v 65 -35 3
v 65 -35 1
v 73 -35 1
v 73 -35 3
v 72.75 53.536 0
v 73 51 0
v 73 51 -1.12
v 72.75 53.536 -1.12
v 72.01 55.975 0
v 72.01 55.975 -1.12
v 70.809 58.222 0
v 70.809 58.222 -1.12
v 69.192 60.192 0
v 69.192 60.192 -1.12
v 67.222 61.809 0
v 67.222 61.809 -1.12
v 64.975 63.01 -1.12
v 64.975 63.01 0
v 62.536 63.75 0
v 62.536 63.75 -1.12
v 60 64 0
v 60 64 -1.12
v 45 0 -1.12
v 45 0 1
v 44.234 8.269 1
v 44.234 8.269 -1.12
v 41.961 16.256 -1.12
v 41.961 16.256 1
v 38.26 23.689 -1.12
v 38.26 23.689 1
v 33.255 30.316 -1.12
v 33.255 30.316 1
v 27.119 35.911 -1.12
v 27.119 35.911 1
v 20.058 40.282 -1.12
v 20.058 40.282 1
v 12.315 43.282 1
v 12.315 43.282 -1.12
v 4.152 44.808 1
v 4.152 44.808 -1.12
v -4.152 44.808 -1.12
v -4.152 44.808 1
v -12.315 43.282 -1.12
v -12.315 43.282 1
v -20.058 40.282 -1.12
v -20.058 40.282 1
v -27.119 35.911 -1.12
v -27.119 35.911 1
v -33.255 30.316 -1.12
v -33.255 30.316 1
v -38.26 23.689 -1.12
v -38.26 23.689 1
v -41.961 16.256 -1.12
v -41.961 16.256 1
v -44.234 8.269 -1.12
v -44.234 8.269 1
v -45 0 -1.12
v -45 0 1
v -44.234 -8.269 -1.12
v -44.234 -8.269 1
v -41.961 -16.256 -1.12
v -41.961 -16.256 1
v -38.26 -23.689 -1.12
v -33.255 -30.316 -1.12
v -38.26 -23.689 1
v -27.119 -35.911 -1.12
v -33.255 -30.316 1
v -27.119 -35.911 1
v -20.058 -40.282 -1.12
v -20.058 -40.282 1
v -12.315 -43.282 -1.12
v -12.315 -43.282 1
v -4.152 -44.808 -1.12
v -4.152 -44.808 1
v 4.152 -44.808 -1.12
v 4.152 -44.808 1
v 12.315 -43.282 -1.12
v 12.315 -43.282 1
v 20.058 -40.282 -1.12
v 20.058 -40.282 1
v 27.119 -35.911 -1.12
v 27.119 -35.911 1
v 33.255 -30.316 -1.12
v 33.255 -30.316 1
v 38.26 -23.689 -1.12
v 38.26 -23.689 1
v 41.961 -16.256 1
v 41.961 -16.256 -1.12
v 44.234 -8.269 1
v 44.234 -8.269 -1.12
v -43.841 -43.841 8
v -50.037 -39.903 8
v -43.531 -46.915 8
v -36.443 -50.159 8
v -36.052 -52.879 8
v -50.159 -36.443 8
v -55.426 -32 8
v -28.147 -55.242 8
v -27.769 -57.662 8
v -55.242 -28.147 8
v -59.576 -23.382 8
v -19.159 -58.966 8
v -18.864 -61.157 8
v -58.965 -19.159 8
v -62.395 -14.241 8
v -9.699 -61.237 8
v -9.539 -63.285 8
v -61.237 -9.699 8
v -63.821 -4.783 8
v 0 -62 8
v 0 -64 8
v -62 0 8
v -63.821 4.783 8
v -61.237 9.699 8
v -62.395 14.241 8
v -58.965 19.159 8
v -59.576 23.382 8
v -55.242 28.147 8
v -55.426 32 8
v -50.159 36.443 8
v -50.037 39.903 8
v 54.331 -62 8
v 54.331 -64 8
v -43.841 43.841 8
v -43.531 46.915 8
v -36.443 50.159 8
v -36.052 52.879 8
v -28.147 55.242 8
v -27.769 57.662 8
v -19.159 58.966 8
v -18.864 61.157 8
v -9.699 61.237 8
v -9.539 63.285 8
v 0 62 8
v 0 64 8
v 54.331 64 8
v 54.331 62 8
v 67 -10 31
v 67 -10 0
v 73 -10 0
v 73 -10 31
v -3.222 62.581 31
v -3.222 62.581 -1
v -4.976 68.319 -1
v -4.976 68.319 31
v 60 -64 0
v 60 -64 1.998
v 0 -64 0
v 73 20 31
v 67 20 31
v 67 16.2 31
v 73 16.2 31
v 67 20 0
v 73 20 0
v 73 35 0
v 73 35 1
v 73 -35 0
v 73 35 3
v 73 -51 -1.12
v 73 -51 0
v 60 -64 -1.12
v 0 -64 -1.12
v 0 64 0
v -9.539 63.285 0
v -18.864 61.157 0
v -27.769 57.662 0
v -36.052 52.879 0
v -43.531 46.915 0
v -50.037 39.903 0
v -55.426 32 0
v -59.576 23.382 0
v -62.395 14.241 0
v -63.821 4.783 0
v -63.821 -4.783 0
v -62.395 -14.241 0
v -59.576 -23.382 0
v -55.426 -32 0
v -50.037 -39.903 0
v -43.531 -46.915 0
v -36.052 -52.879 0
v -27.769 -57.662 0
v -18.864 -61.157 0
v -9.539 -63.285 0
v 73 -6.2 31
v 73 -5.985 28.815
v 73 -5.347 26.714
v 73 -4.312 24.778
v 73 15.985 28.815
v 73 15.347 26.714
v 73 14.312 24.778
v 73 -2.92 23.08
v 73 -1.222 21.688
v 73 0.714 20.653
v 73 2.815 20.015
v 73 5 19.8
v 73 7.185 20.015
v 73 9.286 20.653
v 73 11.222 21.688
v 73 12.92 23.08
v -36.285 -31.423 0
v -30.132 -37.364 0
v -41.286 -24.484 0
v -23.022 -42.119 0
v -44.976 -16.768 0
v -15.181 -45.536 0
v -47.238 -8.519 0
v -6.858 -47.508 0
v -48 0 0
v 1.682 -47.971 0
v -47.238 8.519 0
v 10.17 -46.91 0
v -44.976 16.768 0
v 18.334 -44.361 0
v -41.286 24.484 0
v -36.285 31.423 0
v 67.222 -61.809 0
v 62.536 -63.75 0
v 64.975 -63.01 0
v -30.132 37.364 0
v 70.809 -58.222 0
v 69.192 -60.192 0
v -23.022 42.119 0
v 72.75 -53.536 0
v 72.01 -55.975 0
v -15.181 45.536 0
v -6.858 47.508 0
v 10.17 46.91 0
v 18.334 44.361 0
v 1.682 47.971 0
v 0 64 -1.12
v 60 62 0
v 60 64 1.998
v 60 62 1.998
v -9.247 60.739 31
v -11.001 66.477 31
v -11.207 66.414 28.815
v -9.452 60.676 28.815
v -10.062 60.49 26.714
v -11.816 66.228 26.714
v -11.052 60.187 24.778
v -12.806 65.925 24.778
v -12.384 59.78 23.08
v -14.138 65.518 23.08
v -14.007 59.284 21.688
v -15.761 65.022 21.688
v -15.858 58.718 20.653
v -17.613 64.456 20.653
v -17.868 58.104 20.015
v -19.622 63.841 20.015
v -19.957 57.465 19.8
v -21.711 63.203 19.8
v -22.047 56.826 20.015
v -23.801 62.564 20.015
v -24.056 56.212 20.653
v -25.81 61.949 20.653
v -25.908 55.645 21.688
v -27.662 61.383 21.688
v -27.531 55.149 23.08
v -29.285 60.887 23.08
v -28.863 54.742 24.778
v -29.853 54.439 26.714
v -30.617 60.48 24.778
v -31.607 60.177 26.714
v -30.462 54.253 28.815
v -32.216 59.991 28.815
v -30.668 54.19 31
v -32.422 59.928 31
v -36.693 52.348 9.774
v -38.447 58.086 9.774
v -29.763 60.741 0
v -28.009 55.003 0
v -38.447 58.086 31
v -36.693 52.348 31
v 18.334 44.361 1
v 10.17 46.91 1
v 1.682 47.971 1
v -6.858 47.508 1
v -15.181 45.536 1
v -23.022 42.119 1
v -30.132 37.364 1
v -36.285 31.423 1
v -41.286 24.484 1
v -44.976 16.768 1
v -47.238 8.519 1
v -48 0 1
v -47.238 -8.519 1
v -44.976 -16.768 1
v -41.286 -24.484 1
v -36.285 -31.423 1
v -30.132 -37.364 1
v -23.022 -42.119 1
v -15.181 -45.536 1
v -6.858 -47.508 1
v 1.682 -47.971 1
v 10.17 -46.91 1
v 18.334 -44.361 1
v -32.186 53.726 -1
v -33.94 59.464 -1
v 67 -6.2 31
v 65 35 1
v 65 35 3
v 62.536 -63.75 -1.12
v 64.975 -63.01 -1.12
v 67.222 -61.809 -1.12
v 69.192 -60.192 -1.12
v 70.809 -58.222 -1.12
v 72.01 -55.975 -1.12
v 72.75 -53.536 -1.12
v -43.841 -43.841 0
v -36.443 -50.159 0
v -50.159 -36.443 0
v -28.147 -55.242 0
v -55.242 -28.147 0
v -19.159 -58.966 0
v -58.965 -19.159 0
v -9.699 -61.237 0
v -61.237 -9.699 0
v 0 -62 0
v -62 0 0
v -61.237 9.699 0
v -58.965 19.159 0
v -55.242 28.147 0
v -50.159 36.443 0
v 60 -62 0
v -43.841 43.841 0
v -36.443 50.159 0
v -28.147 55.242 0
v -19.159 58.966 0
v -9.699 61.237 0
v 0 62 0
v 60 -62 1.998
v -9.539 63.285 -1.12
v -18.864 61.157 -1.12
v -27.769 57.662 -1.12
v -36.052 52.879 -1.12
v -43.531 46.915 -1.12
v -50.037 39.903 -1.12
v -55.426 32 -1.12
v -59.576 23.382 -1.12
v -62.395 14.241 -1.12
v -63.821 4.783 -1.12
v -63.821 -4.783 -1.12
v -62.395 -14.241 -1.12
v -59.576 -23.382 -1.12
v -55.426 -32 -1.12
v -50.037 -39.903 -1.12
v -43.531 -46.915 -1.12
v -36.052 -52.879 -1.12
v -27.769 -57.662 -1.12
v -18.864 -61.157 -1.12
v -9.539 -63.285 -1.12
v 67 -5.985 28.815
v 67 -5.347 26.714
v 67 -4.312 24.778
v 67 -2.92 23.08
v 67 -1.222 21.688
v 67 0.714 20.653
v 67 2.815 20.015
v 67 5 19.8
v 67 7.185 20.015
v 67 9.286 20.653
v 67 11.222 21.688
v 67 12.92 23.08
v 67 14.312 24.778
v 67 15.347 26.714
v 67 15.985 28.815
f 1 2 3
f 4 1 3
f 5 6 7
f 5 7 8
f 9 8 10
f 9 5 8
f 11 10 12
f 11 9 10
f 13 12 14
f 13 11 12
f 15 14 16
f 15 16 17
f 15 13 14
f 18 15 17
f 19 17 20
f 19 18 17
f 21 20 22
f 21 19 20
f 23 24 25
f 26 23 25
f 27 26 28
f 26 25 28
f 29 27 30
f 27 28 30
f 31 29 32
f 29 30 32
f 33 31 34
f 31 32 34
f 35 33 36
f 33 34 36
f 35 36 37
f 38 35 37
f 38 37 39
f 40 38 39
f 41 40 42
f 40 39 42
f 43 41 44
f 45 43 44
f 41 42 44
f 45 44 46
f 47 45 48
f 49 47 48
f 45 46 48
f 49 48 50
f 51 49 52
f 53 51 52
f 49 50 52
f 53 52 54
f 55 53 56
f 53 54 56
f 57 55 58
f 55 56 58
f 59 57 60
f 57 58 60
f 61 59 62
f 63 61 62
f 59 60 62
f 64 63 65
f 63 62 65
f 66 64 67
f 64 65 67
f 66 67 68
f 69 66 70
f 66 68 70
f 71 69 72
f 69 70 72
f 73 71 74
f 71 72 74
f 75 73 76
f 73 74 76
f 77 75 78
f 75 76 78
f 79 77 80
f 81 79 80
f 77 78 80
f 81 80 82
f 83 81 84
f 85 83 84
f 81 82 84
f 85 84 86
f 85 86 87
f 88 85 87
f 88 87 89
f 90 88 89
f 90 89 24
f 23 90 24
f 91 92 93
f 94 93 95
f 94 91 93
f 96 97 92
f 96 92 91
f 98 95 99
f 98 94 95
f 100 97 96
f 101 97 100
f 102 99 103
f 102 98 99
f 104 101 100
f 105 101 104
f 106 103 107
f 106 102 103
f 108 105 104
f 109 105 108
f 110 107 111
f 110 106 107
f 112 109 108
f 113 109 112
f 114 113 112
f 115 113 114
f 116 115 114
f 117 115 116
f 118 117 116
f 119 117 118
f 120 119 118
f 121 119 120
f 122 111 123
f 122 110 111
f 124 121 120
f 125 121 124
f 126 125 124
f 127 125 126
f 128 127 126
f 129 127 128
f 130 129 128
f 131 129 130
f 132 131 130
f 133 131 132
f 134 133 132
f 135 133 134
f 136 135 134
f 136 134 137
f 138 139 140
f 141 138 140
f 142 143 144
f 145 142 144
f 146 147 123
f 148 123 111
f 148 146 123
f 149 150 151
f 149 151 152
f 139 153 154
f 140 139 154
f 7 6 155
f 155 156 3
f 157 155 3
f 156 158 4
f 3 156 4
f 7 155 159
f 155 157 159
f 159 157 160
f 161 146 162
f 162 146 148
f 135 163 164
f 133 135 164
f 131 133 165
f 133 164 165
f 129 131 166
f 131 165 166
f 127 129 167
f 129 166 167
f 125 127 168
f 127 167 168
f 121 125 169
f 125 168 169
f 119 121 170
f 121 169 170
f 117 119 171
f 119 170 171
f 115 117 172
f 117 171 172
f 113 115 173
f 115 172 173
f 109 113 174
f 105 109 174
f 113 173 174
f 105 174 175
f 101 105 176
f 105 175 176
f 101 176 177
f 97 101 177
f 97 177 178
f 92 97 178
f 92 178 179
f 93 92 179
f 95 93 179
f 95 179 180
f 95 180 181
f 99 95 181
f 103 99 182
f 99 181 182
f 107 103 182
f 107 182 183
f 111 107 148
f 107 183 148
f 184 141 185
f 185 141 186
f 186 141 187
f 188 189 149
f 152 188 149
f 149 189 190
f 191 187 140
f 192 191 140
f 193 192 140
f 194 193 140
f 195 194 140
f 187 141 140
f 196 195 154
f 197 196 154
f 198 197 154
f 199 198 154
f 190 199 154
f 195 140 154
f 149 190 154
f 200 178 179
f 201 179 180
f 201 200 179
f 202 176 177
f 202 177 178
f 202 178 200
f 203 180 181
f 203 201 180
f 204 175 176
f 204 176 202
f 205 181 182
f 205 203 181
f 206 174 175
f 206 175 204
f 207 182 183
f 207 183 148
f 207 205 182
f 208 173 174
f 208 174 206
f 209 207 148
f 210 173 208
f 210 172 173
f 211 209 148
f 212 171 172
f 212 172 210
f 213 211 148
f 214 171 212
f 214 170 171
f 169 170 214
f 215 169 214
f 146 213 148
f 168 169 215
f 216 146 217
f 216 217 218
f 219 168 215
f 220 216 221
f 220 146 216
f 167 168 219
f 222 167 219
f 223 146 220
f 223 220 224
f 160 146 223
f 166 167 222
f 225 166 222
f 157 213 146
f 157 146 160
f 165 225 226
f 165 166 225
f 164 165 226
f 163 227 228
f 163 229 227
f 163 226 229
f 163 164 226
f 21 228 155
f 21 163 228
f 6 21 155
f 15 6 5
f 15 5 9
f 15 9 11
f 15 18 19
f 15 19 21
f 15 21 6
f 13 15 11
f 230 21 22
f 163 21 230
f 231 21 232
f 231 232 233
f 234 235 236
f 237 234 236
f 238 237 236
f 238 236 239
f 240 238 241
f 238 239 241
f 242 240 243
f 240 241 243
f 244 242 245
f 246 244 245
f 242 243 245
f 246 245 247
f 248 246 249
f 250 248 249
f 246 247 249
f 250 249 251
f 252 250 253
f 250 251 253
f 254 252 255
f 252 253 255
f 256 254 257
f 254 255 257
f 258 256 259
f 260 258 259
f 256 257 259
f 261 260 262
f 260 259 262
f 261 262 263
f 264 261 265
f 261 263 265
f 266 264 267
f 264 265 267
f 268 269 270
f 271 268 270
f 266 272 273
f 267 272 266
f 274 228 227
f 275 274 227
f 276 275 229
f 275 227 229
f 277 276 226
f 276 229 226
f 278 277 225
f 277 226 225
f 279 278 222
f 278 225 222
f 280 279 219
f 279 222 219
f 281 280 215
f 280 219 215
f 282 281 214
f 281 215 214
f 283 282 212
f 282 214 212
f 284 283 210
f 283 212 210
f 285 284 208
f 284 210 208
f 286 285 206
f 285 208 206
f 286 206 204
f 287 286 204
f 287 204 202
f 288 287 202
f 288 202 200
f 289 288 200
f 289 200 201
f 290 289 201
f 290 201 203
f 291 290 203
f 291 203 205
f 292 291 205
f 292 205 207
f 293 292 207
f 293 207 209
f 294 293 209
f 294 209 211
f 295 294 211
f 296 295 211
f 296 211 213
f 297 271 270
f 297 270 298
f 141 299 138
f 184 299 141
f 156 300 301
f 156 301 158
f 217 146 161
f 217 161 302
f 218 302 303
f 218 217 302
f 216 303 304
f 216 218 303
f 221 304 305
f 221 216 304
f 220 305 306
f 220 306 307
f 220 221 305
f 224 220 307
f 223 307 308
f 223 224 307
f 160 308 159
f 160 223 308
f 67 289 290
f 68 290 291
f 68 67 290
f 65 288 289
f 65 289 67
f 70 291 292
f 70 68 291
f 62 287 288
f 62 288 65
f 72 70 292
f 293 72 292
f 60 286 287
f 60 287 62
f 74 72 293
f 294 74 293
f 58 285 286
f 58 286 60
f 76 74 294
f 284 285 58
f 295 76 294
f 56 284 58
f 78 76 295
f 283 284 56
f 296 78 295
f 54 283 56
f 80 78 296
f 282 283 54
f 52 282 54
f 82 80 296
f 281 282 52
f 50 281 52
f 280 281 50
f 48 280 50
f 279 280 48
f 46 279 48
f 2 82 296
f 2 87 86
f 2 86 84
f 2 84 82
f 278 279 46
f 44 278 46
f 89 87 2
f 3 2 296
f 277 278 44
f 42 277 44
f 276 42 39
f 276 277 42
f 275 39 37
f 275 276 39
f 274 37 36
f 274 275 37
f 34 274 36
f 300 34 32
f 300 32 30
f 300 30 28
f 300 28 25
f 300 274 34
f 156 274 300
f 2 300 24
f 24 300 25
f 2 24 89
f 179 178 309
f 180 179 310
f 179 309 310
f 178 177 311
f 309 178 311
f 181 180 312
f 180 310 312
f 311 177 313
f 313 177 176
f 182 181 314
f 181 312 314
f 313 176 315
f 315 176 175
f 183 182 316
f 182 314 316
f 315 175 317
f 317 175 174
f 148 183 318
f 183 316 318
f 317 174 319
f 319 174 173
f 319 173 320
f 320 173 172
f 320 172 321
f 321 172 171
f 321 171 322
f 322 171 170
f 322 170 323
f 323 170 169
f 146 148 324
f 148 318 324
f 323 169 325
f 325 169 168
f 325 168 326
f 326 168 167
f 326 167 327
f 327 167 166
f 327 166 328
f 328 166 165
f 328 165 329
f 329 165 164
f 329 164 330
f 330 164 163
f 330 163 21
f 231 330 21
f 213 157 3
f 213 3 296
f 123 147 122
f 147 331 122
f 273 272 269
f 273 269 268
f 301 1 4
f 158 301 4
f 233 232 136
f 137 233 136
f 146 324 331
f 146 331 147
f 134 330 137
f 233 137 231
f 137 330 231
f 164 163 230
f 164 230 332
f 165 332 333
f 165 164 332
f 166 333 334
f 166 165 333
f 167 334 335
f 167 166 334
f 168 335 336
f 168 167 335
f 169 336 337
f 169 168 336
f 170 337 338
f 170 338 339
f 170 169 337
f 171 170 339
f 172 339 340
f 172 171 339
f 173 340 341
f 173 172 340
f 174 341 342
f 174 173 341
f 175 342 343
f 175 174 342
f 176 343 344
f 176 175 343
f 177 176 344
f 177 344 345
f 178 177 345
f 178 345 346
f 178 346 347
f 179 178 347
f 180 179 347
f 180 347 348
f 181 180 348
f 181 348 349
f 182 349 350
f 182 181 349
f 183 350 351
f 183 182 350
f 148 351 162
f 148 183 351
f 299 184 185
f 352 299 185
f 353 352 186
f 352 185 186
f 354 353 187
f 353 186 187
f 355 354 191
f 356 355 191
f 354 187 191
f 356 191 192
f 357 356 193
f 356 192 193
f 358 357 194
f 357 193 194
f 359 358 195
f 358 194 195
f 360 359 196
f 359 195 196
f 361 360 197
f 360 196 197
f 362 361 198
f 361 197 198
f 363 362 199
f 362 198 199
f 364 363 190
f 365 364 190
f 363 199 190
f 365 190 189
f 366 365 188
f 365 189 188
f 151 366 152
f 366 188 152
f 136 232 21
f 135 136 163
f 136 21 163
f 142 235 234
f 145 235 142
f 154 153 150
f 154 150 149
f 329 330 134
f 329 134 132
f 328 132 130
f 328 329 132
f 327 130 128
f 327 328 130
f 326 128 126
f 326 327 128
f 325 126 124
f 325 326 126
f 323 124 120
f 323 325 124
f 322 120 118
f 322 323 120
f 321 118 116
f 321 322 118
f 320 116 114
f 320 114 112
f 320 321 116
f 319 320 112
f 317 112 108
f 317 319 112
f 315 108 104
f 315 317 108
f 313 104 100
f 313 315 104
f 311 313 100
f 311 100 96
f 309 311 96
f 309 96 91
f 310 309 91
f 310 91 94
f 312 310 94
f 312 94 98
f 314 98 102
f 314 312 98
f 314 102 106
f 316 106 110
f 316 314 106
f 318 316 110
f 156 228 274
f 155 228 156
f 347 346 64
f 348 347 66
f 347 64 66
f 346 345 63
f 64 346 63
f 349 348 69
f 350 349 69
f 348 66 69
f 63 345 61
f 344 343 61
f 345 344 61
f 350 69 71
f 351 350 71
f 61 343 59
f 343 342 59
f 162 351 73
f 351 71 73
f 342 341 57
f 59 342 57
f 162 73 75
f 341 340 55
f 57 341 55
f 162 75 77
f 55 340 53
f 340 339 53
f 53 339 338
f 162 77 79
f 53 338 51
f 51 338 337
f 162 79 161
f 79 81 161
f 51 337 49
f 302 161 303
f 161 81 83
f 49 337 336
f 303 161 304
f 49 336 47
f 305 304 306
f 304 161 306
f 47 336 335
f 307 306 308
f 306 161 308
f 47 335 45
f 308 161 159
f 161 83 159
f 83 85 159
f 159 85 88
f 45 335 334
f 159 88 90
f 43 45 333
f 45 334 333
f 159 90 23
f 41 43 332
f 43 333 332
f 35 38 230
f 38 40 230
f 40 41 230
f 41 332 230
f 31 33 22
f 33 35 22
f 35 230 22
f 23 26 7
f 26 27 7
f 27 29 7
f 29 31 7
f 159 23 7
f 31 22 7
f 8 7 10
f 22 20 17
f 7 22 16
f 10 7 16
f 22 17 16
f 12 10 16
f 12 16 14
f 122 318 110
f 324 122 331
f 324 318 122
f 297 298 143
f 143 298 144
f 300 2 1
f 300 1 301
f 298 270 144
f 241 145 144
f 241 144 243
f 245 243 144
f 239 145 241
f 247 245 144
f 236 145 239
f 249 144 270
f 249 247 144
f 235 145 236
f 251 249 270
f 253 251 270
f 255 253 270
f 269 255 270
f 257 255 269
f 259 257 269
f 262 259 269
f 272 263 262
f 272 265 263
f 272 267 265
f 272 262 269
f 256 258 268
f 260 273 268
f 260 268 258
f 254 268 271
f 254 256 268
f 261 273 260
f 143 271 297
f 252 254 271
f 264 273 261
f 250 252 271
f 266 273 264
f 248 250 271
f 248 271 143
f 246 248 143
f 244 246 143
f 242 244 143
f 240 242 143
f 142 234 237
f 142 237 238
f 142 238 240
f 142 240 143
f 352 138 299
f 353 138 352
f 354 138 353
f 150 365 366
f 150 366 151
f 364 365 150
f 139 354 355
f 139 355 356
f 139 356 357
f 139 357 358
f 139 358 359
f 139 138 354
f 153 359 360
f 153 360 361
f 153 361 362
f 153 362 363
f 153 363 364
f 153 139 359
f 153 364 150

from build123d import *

# Parameters (mm, degrees)
PAD001_DEPTH      = 8
POCKET005_DEPTH   = 128.0010000001
SKETCH020_W       = 6
SKETCH020_H       = 30
PAD004_DEPTH      = 31
SKETCH021_R       = 11.2
POCKET_DEPTH      = 6.001
PAD005_DEPTH      = 31
PAD005_DEPTH_BACK = 1
SKETCH022_R       = 11.2
POCKET006_DEPTH   = 15.7868758107
POCKET007_DEPTH   = 6
SKETCH001_R       = 45
PAD_DEPTH         = 1.12
SKETCH_W          = 8
SKETCH_H          = 70
PAD003_DEPTH      = 3
SKETCH024_R       = 48
PAD006_DEPTH      = 1
SKETCH025_R       = 45
POCKET008_DEPTH   = 2.121
PAD007_DEPTH      = 1
SKETCH027_R       = 45
POCKET009_DEPTH   = 2.121


with BuildPart() as bevel_connector:
    # Sketch002 → Pad001 (new body)
    with BuildSketch(Plane.XY):
        with BuildLine():
            Line((60, 64), (0, 64))
            ThreePointArc((0, 64), (-63.9999355288, 0), (0, -64))
            Line((60, -64), (0, -64))
            Line((60, -62), (60, -64))
            Line((0, -62), (60, -62))
            ThreePointArc((0, 62), (-61.9999854046, 0), (0, -62))
            Line((0, 62), (60, 62))
            Line((60, 64), (60, 62))
        make_face()
    extrude(amount=PAD001_DEPTH)

    # Sketch011 → Pocket005 (cut, through all)
    with BuildSketch(Plane(origin=(0, 64, 0), x_dir=(-1, 0, 0), z_dir=(0, 1, 0))):
        Polygon((-53.9525, 8.40024), (-64.2022626889, 10.8364072587), (-61.1871640783, 0.741768758), align=None)
    extrude(amount=-POCKET005_DEPTH, mode=Mode.SUBTRACT)


with BuildPart() as synchole:
    # Sketch020 → Pad004 (new body)
    with BuildSketch(Plane.XY):
        with Locations((70, 5)):
            Rectangle(SKETCH020_W, SKETCH020_H)
    extrude(amount=PAD004_DEPTH)

    # Sketch021 → Pocket (cut, through all)
    with BuildSketch(Plane.YZ.offset(73)):
        with Locations((5, 31)):
            Circle(SKETCH021_R)
    extrude(amount=-POCKET_DEPTH, mode=Mode.SUBTRACT)


with BuildPart() as stbevel1:
    # Sketch017 → Pad005 (new body, two sides)
    with BuildSketch(Plane.XY) as pad005_sk:
        Polygon((-4.9761521334, 68.3190157273), (-38.4468185922, 58.086006062), (-36.6925883638, 52.3481775262), (-3.2219219051, 62.5811871915), align=None)
    extrude(amount=PAD005_DEPTH)
    extrude(pad005_sk.sketch, amount=-PAD005_DEPTH_BACK)

    # Sketch022 → Pocket006 (cut, through all)
    with BuildSketch(Plane(origin=(-19.5271219074, 63.8703378224, 0), x_dir=(-0.956304756, -0.2923717047, 0), z_dir=(-0.2923717047, 0.956304756, 0))):
        with Locations((2.2841708584, 31)):
            Circle(SKETCH022_R)
    extrude(amount=-POCKET006_DEPTH, mode=Mode.SUBTRACT)

    # Sketch023 → Pocket007 (cut)
    with BuildSketch(Plane(origin=(-19.5271219074, 63.8703378224, 0), x_dir=(-0.956304756, -0.2923717047, 0), z_dir=(-0.2923717047, 0.956304756, 0))):
        Polygon((31.7540235497, 22.6567880743), (10.7035, 0), (40.8501158154, -6.9018941198), align=None)
    extrude(amount=-POCKET007_DEPTH, mode=Mode.SUBTRACT)


with BuildPart() as fieldstiffenerhole:
    # Sketch001 → Pad (new body)
    with BuildSketch(Plane.XY):
        with BuildLine():
            Line((60, 64), (0, 64))
            ThreePointArc((0, 63.9999999999), (-63.9999178097, 0), (0, -63.9999999999))
            Line((60, -63.9999999999), (0, -63.9999999999))
            ThreePointArc((60, -64), (69.1923881554, -60.1923881554), (73, -51))
            Line((73, 51), (73, -51))
            ThreePointArc((73, 51), (69.1923881554, 60.1923881554), (60, 64))
        make_face()
        Circle(SKETCH001_R, mode=Mode.SUBTRACT)
    extrude(amount=-PAD_DEPTH)

    # Sketch → Pad003 (new body)
    with BuildSketch(Plane.XY):
        with Locations((69, 0)):
            Rectangle(SKETCH_W, SKETCH_H)
    extrude(amount=PAD003_DEPTH)

    # Sketch024 → Pad006 (new body)
    with BuildSketch(Plane.XY):
        Circle(SKETCH024_R)
    extrude(amount=PAD006_DEPTH)

    # Sketch025 → Pocket008 (cut, through all)
    with BuildSketch(Plane.XY.offset(1)):
        Circle(SKETCH025_R)
    extrude(amount=-POCKET008_DEPTH, mode=Mode.SUBTRACT)

    # Sketch026 → Pad007 (new body)
    with BuildSketch(Plane.XY):
        Polygon((0, 47.5), (73, 35), (73, -35), (0, -47.5), align=None)
    extrude(amount=PAD007_DEPTH)

    # Sketch027 → Pocket009 (cut, through all)
    with BuildSketch(Plane.XY.offset(1)):
        Circle(SKETCH027_R)
    extrude(amount=-POCKET009_DEPTH, mode=Mode.SUBTRACT)


solid = Compound([bevel_connector.part, synchole.part, stbevel1.part, fieldstiffenerhole.part])
